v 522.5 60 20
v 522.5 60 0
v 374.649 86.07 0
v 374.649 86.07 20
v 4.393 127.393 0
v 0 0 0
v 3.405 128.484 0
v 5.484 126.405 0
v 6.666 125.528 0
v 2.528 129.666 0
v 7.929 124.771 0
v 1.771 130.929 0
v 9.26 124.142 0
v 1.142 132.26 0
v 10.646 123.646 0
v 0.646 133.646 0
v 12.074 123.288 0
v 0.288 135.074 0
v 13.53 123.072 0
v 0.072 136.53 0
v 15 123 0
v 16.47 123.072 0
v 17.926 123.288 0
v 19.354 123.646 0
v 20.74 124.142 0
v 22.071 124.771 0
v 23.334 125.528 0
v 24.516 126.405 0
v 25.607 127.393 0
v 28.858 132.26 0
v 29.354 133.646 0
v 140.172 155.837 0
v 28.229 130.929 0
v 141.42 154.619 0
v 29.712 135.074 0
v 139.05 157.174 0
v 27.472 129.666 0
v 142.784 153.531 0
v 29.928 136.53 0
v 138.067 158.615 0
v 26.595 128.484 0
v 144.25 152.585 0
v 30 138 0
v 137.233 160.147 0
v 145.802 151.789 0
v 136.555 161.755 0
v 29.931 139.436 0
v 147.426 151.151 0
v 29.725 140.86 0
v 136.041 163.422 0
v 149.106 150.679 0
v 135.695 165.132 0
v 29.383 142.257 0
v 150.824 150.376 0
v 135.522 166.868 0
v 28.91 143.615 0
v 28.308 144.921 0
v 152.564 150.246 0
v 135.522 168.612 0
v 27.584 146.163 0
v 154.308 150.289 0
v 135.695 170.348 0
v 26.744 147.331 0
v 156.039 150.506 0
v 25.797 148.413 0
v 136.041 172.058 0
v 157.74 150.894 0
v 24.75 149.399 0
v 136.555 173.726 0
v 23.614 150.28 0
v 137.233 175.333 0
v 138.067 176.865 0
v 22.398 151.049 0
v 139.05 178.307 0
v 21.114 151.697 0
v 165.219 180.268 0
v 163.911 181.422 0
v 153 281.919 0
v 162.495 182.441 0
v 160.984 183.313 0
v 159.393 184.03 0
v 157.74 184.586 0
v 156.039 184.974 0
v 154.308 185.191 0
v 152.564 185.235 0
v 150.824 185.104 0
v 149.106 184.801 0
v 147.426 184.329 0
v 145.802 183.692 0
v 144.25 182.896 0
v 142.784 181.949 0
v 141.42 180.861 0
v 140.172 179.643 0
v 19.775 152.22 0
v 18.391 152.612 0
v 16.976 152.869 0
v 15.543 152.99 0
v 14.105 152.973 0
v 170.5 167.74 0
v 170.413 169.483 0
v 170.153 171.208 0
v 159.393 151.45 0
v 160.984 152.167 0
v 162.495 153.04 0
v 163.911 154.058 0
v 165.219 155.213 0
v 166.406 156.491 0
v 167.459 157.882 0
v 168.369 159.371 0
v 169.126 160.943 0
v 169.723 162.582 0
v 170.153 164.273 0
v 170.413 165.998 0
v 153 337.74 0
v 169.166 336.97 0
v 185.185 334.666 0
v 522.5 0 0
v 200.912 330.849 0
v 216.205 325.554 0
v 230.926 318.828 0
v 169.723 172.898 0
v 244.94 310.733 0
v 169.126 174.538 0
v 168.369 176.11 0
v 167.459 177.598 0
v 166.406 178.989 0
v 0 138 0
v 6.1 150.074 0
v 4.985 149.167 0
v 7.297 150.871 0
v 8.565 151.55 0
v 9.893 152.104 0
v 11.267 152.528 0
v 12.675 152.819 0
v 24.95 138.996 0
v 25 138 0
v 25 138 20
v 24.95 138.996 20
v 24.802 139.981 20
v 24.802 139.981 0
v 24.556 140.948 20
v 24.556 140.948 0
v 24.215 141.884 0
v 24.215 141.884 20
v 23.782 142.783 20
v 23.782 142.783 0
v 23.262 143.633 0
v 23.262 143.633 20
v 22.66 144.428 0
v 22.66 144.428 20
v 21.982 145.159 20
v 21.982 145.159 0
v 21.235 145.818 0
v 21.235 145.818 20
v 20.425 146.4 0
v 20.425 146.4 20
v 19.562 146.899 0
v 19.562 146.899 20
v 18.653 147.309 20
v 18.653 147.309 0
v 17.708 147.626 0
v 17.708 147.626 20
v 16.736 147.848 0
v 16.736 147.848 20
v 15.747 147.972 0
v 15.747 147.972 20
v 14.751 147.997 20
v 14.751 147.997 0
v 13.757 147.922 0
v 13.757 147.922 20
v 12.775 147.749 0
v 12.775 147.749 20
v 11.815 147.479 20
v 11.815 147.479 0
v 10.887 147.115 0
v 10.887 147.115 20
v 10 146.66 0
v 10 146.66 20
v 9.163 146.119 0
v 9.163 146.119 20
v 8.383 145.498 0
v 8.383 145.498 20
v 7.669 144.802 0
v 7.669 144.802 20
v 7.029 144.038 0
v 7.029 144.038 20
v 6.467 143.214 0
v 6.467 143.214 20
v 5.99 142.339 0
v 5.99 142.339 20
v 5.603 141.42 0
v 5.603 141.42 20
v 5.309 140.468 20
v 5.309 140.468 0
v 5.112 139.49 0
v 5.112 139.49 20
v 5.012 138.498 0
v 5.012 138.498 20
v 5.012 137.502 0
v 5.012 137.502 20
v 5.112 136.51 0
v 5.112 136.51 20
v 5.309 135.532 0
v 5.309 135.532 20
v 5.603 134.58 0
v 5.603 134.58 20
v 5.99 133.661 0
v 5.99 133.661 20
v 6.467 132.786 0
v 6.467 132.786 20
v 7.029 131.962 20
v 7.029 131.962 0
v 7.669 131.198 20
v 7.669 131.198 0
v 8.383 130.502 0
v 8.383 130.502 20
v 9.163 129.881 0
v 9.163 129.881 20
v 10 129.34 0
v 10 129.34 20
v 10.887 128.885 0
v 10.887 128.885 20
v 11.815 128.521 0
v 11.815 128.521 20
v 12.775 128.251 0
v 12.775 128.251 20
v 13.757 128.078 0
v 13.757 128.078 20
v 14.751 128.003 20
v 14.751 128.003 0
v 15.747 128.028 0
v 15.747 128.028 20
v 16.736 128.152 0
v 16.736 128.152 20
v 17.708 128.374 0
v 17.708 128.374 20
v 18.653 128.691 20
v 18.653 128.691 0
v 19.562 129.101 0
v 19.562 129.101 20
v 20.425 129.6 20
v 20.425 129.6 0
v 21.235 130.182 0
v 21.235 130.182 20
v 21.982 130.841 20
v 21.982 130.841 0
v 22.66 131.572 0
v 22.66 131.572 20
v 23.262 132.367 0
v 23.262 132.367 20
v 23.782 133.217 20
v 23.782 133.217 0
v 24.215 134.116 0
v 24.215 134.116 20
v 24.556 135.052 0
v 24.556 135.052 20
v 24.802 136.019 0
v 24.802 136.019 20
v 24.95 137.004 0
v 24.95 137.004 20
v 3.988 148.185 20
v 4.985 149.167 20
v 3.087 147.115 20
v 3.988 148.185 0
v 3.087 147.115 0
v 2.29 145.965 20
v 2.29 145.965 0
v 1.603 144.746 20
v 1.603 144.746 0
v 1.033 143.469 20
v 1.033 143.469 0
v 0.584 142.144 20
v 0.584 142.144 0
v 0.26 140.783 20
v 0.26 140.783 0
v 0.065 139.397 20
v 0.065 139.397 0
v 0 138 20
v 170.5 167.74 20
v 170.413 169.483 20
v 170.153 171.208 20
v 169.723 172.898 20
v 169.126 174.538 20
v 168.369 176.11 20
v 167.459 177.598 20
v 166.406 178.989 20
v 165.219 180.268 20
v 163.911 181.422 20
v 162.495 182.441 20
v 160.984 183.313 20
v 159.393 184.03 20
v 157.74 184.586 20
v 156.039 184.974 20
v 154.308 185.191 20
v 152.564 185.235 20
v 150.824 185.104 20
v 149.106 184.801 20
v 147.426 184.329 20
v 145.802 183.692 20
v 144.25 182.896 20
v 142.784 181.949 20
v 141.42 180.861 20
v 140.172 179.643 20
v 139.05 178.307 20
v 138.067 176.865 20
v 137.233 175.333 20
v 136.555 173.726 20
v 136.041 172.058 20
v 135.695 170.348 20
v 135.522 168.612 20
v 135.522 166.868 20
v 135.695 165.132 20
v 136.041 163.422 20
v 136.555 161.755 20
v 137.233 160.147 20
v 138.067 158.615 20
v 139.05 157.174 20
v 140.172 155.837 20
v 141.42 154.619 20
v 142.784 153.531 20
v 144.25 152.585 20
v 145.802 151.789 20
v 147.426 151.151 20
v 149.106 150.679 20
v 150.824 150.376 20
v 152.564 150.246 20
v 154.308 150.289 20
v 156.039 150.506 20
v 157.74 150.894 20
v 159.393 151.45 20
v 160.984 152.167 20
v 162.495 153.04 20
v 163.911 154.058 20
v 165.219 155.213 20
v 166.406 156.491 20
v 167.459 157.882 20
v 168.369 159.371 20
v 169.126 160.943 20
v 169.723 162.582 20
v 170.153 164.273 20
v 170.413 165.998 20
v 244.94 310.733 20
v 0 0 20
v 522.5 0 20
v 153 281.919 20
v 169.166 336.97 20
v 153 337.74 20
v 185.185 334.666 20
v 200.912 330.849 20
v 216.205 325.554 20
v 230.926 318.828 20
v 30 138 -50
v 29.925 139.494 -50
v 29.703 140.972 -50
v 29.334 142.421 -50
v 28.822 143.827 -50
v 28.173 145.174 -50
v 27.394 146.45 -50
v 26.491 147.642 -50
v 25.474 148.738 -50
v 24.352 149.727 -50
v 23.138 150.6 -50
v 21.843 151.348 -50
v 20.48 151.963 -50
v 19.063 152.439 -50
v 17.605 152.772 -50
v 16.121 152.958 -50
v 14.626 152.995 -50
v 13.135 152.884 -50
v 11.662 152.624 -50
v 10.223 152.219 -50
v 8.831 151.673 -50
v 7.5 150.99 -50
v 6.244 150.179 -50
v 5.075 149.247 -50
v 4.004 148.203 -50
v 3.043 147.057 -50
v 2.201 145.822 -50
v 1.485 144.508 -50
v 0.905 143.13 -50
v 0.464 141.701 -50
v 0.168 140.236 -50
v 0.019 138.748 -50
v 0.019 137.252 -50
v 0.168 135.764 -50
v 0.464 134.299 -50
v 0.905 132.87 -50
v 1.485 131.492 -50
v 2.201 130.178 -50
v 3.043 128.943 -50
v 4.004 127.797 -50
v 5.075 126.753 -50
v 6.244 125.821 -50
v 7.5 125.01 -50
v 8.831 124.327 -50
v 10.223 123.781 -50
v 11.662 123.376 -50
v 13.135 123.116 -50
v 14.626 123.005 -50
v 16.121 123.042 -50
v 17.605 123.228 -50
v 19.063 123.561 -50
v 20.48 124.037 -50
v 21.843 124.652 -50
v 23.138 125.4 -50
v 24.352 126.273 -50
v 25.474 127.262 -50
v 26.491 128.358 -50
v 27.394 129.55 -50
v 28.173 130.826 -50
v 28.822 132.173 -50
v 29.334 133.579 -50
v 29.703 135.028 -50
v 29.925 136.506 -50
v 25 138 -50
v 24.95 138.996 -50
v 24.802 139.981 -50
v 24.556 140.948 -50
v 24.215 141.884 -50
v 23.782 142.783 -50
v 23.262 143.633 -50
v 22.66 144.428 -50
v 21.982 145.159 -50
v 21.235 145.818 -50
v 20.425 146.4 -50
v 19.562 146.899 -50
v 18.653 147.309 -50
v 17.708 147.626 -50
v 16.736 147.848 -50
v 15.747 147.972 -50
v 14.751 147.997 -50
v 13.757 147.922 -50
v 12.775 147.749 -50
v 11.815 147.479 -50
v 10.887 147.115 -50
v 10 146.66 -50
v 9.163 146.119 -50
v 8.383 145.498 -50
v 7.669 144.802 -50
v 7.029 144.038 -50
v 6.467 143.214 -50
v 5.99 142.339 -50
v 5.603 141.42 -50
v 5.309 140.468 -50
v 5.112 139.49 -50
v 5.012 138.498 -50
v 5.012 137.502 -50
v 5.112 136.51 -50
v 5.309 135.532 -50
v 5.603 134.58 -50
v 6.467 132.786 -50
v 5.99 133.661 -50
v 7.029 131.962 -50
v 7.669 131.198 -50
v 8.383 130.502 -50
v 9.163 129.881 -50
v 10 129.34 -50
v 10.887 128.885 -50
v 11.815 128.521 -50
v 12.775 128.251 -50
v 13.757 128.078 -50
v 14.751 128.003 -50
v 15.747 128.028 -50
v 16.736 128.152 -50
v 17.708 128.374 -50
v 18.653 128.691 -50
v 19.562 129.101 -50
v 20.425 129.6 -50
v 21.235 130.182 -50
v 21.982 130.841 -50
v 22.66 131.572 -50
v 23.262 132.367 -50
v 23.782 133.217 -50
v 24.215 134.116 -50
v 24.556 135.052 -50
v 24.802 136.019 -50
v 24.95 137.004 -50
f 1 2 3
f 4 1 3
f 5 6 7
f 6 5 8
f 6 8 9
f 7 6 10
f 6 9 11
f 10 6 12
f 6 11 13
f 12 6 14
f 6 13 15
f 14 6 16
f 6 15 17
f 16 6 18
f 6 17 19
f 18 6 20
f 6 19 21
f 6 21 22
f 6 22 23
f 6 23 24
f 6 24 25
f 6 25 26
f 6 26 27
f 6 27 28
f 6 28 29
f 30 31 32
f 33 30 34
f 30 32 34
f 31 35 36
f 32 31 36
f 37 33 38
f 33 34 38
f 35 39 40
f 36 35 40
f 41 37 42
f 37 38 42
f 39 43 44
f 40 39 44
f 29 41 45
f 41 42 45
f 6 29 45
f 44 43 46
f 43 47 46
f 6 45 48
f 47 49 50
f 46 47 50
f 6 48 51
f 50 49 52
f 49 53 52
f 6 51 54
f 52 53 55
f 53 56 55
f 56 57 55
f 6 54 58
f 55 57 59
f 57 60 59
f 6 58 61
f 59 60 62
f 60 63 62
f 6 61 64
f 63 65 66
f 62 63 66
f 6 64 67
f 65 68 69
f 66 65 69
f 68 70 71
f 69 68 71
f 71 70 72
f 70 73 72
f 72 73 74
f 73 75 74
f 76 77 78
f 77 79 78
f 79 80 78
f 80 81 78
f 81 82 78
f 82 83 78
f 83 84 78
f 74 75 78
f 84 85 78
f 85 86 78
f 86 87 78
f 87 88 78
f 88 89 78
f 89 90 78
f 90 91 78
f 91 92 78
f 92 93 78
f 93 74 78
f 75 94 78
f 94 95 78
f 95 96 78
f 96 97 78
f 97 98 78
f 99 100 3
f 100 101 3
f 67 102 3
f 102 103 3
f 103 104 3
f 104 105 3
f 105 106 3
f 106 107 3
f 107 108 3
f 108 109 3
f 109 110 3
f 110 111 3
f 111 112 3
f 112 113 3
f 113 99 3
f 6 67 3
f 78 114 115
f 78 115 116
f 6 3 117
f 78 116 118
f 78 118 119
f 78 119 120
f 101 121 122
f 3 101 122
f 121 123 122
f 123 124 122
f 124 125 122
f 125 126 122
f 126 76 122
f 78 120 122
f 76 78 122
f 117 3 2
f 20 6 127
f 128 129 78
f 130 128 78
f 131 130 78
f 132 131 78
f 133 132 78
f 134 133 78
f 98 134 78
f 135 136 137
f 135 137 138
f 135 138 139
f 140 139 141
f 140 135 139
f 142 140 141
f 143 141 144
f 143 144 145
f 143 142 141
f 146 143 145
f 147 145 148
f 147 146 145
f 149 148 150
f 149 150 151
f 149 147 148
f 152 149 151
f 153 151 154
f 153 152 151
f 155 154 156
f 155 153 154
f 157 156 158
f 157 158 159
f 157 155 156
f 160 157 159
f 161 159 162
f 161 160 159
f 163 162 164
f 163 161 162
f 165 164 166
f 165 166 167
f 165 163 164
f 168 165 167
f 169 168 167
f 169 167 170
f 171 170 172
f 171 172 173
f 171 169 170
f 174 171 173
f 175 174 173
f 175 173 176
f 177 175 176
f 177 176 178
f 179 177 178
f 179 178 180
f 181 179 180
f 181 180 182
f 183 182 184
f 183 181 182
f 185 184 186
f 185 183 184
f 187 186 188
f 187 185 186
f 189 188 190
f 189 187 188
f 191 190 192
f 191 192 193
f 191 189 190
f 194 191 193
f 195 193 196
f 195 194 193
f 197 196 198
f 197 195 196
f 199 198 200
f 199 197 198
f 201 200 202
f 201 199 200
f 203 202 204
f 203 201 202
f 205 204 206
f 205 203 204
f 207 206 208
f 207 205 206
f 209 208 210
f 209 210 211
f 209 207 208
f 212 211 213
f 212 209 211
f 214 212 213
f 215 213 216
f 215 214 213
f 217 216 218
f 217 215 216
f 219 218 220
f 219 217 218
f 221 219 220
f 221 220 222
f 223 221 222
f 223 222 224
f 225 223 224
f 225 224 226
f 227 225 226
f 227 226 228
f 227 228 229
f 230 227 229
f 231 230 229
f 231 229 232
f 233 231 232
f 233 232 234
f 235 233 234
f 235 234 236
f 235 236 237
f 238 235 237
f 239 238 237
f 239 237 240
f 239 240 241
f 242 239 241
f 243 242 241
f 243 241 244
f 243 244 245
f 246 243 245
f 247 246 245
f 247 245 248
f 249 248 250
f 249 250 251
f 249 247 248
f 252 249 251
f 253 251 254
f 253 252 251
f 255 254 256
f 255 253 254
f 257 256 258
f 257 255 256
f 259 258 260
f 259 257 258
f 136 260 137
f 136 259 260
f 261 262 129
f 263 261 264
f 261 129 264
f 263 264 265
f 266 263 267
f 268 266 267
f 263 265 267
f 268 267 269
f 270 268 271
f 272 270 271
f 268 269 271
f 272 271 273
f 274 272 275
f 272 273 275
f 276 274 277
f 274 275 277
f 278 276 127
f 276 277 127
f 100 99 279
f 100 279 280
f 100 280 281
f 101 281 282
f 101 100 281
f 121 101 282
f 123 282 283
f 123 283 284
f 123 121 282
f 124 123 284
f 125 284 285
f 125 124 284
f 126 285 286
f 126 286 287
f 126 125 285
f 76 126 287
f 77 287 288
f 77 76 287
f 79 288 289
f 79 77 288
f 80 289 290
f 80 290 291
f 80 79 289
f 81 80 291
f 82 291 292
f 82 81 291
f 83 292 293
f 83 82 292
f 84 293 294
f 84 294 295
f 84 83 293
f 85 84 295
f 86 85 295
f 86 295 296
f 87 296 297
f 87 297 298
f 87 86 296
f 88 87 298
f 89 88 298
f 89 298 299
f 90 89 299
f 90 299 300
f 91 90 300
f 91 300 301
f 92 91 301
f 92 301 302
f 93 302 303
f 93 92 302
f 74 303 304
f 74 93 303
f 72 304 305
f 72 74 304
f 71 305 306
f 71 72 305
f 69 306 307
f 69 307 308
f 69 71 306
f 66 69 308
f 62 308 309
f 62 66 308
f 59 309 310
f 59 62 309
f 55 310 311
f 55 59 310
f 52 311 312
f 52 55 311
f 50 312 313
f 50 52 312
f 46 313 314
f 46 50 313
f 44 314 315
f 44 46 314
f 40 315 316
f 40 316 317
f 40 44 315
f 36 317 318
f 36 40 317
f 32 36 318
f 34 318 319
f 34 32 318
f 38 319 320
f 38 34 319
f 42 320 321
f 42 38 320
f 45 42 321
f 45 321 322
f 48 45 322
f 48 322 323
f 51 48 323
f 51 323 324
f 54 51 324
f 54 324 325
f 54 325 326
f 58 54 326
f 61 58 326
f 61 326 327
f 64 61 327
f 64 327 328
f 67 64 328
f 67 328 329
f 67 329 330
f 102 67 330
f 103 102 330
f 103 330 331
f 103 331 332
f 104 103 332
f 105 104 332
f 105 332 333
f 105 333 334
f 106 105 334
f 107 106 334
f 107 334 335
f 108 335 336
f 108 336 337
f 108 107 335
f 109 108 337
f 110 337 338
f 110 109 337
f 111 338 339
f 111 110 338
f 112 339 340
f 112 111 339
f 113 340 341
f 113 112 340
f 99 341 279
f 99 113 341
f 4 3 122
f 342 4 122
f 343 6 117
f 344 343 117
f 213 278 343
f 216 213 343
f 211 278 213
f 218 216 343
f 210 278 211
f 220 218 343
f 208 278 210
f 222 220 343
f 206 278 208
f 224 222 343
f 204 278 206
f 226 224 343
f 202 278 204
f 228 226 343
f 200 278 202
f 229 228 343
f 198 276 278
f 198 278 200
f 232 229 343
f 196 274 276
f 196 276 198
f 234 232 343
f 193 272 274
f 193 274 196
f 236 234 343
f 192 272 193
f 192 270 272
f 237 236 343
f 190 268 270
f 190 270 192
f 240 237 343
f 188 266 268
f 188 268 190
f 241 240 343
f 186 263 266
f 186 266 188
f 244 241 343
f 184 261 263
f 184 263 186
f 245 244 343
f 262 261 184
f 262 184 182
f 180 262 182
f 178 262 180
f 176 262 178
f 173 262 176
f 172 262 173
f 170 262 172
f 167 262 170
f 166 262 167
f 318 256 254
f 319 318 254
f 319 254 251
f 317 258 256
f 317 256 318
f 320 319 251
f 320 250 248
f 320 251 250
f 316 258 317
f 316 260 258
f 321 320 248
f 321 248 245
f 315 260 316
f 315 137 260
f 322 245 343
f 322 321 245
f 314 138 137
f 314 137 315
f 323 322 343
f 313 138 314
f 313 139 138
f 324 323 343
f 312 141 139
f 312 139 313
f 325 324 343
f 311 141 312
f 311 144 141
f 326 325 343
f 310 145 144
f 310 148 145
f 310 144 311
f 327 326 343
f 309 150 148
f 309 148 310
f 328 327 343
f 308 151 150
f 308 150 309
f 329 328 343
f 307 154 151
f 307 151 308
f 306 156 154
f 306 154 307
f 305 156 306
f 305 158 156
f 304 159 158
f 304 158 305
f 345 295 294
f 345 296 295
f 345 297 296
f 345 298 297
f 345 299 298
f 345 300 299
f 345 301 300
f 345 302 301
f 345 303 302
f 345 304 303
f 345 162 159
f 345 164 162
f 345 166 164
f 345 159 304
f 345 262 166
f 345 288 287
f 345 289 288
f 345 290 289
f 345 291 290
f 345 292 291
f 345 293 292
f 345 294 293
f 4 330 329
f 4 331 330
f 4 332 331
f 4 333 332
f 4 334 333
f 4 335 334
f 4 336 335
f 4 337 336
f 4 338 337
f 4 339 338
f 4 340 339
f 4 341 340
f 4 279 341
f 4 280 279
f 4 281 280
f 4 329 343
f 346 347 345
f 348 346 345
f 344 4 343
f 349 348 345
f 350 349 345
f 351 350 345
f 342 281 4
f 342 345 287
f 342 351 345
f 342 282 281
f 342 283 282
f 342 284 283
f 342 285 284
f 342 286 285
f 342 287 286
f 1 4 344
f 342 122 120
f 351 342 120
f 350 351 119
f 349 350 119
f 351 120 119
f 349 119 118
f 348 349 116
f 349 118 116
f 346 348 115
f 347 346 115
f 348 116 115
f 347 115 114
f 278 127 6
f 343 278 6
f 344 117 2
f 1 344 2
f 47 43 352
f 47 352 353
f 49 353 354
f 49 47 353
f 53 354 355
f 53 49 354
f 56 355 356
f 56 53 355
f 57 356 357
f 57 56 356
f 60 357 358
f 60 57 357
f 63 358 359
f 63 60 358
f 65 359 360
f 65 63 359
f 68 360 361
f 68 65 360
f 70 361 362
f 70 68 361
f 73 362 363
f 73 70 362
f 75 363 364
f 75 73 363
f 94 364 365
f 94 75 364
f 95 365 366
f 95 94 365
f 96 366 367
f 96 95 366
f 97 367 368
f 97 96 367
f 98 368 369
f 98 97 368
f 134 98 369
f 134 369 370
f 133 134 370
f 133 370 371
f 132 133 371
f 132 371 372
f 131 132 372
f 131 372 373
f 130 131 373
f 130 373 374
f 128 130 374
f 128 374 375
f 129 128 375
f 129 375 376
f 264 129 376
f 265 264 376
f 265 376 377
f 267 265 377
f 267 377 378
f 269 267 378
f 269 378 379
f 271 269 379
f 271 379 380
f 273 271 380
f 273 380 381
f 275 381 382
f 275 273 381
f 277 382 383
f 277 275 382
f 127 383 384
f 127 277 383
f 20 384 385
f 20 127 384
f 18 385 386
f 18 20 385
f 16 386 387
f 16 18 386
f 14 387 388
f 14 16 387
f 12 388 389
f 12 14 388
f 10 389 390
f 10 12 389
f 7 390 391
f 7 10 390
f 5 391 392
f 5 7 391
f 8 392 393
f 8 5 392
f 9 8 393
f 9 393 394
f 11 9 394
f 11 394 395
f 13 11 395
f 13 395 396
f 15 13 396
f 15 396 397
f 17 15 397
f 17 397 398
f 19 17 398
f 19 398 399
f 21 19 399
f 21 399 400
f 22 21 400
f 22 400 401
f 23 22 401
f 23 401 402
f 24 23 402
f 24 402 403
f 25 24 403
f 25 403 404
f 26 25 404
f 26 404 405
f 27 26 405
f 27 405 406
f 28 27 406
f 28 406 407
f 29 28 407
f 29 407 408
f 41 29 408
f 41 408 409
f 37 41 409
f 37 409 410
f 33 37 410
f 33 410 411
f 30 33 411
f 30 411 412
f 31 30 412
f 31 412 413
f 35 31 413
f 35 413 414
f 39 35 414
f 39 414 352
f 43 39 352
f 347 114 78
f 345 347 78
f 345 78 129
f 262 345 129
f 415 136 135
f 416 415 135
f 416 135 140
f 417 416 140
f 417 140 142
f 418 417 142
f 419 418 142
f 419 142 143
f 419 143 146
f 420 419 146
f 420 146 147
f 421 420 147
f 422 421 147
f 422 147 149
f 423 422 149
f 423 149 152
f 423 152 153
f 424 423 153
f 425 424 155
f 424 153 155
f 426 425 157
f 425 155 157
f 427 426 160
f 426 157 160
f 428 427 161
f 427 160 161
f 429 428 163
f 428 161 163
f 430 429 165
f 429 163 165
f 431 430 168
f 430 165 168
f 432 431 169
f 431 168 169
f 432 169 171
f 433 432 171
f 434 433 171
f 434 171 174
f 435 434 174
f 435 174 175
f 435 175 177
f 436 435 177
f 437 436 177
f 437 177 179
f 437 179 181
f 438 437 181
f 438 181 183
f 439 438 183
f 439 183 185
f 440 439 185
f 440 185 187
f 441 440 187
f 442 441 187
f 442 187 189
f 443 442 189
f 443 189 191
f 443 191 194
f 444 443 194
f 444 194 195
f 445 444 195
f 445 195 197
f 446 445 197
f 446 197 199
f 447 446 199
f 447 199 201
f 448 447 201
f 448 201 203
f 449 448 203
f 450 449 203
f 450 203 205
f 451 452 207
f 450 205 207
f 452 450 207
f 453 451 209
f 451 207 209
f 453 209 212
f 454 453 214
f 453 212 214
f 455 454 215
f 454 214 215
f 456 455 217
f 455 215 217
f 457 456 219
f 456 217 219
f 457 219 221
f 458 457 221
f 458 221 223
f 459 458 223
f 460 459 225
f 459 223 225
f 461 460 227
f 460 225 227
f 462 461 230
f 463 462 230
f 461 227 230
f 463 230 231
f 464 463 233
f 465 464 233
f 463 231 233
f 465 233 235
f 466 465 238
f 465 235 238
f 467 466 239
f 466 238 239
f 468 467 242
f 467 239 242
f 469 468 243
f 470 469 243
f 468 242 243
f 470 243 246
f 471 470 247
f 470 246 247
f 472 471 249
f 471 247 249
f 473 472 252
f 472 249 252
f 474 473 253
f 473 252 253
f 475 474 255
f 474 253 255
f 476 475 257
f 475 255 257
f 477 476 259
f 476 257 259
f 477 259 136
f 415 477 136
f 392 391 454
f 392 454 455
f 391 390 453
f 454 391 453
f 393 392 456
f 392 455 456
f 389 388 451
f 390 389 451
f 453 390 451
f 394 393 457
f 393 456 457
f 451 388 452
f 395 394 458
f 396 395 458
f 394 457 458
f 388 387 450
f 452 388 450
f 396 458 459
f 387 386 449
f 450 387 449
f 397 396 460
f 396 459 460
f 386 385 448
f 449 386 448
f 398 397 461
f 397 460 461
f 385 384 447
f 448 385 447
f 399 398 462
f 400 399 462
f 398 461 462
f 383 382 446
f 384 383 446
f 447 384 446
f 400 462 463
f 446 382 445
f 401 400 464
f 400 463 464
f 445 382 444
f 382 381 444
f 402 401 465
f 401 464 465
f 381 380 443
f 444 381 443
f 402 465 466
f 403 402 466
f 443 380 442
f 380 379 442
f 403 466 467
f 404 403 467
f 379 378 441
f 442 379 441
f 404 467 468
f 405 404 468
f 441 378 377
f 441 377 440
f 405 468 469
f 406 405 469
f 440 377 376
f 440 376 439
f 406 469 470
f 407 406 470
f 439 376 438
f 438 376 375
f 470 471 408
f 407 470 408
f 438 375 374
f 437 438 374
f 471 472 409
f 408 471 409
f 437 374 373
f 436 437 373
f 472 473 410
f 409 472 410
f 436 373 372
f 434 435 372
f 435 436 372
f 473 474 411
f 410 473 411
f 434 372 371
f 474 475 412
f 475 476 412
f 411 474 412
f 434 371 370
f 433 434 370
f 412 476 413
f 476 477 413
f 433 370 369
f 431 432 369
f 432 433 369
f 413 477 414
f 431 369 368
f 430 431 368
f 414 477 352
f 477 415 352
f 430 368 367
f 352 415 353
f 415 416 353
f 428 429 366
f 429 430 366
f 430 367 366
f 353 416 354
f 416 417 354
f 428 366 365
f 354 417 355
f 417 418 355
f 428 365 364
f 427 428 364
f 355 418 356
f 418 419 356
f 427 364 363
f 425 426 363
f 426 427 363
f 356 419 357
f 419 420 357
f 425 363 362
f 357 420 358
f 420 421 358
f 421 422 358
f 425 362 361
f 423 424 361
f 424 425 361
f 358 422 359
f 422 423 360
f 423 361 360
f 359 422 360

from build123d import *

# Parameters (mm, degrees)
SKETCH1_R           = 17.5
SKETCH1_R_2         = 10
BOSS_EXTRUDE1_DEPTH = 20
SKETCH2_R           = 15
SKETCH2_R_2         = 10
BOSS_EXTRUDE2_DEPTH = 70


with BuildPart() as part:
    # Sketch1 → Boss-Extrude1 (new body)
    with BuildSketch(Plane.XY):
        with BuildLine():
            Line((0, 138), (0, 0))
            Line((0, 0), (522.5, 0))
            Line((522.5, 0), (522.5, 60))
            Line((522.5, 60), (374.6494, 86.07005))
            Line((374.6494, 86.07005), (244.94, 310.733321))
            ThreePointArc((244.94, 310.733321), (200.912249, 330.84879), (153, 337.740187))
            Line((153, 337.740187), (153, 281.918848))
            Line((153, 281.918848), (4.984782, 149.16671))
            ThreePointArc((4.984782, 149.16671), (1.302769, 144.114398), (0, 138))
        make_face()
        with Locations((153, 167.740187)):
            Circle(SKETCH1_R, mode=Mode.SUBTRACT)
        with Locations((15, 138)):
            Circle(SKETCH1_R_2, mode=Mode.SUBTRACT)
    extrude(amount=BOSS_EXTRUDE1_DEPTH)

    # Sketch2 → Boss-Extrude2 (add)
    with BuildSketch(Plane.XY.offset(20)):
        with Locations((15, 138)):
            Circle(SKETCH2_R)
        with Locations((15, 138)):
            Circle(SKETCH2_R_2, mode=Mode.SUBTRACT)
    extrude(amount=-BOSS_EXTRUDE2_DEPTH)


solid = part.part
